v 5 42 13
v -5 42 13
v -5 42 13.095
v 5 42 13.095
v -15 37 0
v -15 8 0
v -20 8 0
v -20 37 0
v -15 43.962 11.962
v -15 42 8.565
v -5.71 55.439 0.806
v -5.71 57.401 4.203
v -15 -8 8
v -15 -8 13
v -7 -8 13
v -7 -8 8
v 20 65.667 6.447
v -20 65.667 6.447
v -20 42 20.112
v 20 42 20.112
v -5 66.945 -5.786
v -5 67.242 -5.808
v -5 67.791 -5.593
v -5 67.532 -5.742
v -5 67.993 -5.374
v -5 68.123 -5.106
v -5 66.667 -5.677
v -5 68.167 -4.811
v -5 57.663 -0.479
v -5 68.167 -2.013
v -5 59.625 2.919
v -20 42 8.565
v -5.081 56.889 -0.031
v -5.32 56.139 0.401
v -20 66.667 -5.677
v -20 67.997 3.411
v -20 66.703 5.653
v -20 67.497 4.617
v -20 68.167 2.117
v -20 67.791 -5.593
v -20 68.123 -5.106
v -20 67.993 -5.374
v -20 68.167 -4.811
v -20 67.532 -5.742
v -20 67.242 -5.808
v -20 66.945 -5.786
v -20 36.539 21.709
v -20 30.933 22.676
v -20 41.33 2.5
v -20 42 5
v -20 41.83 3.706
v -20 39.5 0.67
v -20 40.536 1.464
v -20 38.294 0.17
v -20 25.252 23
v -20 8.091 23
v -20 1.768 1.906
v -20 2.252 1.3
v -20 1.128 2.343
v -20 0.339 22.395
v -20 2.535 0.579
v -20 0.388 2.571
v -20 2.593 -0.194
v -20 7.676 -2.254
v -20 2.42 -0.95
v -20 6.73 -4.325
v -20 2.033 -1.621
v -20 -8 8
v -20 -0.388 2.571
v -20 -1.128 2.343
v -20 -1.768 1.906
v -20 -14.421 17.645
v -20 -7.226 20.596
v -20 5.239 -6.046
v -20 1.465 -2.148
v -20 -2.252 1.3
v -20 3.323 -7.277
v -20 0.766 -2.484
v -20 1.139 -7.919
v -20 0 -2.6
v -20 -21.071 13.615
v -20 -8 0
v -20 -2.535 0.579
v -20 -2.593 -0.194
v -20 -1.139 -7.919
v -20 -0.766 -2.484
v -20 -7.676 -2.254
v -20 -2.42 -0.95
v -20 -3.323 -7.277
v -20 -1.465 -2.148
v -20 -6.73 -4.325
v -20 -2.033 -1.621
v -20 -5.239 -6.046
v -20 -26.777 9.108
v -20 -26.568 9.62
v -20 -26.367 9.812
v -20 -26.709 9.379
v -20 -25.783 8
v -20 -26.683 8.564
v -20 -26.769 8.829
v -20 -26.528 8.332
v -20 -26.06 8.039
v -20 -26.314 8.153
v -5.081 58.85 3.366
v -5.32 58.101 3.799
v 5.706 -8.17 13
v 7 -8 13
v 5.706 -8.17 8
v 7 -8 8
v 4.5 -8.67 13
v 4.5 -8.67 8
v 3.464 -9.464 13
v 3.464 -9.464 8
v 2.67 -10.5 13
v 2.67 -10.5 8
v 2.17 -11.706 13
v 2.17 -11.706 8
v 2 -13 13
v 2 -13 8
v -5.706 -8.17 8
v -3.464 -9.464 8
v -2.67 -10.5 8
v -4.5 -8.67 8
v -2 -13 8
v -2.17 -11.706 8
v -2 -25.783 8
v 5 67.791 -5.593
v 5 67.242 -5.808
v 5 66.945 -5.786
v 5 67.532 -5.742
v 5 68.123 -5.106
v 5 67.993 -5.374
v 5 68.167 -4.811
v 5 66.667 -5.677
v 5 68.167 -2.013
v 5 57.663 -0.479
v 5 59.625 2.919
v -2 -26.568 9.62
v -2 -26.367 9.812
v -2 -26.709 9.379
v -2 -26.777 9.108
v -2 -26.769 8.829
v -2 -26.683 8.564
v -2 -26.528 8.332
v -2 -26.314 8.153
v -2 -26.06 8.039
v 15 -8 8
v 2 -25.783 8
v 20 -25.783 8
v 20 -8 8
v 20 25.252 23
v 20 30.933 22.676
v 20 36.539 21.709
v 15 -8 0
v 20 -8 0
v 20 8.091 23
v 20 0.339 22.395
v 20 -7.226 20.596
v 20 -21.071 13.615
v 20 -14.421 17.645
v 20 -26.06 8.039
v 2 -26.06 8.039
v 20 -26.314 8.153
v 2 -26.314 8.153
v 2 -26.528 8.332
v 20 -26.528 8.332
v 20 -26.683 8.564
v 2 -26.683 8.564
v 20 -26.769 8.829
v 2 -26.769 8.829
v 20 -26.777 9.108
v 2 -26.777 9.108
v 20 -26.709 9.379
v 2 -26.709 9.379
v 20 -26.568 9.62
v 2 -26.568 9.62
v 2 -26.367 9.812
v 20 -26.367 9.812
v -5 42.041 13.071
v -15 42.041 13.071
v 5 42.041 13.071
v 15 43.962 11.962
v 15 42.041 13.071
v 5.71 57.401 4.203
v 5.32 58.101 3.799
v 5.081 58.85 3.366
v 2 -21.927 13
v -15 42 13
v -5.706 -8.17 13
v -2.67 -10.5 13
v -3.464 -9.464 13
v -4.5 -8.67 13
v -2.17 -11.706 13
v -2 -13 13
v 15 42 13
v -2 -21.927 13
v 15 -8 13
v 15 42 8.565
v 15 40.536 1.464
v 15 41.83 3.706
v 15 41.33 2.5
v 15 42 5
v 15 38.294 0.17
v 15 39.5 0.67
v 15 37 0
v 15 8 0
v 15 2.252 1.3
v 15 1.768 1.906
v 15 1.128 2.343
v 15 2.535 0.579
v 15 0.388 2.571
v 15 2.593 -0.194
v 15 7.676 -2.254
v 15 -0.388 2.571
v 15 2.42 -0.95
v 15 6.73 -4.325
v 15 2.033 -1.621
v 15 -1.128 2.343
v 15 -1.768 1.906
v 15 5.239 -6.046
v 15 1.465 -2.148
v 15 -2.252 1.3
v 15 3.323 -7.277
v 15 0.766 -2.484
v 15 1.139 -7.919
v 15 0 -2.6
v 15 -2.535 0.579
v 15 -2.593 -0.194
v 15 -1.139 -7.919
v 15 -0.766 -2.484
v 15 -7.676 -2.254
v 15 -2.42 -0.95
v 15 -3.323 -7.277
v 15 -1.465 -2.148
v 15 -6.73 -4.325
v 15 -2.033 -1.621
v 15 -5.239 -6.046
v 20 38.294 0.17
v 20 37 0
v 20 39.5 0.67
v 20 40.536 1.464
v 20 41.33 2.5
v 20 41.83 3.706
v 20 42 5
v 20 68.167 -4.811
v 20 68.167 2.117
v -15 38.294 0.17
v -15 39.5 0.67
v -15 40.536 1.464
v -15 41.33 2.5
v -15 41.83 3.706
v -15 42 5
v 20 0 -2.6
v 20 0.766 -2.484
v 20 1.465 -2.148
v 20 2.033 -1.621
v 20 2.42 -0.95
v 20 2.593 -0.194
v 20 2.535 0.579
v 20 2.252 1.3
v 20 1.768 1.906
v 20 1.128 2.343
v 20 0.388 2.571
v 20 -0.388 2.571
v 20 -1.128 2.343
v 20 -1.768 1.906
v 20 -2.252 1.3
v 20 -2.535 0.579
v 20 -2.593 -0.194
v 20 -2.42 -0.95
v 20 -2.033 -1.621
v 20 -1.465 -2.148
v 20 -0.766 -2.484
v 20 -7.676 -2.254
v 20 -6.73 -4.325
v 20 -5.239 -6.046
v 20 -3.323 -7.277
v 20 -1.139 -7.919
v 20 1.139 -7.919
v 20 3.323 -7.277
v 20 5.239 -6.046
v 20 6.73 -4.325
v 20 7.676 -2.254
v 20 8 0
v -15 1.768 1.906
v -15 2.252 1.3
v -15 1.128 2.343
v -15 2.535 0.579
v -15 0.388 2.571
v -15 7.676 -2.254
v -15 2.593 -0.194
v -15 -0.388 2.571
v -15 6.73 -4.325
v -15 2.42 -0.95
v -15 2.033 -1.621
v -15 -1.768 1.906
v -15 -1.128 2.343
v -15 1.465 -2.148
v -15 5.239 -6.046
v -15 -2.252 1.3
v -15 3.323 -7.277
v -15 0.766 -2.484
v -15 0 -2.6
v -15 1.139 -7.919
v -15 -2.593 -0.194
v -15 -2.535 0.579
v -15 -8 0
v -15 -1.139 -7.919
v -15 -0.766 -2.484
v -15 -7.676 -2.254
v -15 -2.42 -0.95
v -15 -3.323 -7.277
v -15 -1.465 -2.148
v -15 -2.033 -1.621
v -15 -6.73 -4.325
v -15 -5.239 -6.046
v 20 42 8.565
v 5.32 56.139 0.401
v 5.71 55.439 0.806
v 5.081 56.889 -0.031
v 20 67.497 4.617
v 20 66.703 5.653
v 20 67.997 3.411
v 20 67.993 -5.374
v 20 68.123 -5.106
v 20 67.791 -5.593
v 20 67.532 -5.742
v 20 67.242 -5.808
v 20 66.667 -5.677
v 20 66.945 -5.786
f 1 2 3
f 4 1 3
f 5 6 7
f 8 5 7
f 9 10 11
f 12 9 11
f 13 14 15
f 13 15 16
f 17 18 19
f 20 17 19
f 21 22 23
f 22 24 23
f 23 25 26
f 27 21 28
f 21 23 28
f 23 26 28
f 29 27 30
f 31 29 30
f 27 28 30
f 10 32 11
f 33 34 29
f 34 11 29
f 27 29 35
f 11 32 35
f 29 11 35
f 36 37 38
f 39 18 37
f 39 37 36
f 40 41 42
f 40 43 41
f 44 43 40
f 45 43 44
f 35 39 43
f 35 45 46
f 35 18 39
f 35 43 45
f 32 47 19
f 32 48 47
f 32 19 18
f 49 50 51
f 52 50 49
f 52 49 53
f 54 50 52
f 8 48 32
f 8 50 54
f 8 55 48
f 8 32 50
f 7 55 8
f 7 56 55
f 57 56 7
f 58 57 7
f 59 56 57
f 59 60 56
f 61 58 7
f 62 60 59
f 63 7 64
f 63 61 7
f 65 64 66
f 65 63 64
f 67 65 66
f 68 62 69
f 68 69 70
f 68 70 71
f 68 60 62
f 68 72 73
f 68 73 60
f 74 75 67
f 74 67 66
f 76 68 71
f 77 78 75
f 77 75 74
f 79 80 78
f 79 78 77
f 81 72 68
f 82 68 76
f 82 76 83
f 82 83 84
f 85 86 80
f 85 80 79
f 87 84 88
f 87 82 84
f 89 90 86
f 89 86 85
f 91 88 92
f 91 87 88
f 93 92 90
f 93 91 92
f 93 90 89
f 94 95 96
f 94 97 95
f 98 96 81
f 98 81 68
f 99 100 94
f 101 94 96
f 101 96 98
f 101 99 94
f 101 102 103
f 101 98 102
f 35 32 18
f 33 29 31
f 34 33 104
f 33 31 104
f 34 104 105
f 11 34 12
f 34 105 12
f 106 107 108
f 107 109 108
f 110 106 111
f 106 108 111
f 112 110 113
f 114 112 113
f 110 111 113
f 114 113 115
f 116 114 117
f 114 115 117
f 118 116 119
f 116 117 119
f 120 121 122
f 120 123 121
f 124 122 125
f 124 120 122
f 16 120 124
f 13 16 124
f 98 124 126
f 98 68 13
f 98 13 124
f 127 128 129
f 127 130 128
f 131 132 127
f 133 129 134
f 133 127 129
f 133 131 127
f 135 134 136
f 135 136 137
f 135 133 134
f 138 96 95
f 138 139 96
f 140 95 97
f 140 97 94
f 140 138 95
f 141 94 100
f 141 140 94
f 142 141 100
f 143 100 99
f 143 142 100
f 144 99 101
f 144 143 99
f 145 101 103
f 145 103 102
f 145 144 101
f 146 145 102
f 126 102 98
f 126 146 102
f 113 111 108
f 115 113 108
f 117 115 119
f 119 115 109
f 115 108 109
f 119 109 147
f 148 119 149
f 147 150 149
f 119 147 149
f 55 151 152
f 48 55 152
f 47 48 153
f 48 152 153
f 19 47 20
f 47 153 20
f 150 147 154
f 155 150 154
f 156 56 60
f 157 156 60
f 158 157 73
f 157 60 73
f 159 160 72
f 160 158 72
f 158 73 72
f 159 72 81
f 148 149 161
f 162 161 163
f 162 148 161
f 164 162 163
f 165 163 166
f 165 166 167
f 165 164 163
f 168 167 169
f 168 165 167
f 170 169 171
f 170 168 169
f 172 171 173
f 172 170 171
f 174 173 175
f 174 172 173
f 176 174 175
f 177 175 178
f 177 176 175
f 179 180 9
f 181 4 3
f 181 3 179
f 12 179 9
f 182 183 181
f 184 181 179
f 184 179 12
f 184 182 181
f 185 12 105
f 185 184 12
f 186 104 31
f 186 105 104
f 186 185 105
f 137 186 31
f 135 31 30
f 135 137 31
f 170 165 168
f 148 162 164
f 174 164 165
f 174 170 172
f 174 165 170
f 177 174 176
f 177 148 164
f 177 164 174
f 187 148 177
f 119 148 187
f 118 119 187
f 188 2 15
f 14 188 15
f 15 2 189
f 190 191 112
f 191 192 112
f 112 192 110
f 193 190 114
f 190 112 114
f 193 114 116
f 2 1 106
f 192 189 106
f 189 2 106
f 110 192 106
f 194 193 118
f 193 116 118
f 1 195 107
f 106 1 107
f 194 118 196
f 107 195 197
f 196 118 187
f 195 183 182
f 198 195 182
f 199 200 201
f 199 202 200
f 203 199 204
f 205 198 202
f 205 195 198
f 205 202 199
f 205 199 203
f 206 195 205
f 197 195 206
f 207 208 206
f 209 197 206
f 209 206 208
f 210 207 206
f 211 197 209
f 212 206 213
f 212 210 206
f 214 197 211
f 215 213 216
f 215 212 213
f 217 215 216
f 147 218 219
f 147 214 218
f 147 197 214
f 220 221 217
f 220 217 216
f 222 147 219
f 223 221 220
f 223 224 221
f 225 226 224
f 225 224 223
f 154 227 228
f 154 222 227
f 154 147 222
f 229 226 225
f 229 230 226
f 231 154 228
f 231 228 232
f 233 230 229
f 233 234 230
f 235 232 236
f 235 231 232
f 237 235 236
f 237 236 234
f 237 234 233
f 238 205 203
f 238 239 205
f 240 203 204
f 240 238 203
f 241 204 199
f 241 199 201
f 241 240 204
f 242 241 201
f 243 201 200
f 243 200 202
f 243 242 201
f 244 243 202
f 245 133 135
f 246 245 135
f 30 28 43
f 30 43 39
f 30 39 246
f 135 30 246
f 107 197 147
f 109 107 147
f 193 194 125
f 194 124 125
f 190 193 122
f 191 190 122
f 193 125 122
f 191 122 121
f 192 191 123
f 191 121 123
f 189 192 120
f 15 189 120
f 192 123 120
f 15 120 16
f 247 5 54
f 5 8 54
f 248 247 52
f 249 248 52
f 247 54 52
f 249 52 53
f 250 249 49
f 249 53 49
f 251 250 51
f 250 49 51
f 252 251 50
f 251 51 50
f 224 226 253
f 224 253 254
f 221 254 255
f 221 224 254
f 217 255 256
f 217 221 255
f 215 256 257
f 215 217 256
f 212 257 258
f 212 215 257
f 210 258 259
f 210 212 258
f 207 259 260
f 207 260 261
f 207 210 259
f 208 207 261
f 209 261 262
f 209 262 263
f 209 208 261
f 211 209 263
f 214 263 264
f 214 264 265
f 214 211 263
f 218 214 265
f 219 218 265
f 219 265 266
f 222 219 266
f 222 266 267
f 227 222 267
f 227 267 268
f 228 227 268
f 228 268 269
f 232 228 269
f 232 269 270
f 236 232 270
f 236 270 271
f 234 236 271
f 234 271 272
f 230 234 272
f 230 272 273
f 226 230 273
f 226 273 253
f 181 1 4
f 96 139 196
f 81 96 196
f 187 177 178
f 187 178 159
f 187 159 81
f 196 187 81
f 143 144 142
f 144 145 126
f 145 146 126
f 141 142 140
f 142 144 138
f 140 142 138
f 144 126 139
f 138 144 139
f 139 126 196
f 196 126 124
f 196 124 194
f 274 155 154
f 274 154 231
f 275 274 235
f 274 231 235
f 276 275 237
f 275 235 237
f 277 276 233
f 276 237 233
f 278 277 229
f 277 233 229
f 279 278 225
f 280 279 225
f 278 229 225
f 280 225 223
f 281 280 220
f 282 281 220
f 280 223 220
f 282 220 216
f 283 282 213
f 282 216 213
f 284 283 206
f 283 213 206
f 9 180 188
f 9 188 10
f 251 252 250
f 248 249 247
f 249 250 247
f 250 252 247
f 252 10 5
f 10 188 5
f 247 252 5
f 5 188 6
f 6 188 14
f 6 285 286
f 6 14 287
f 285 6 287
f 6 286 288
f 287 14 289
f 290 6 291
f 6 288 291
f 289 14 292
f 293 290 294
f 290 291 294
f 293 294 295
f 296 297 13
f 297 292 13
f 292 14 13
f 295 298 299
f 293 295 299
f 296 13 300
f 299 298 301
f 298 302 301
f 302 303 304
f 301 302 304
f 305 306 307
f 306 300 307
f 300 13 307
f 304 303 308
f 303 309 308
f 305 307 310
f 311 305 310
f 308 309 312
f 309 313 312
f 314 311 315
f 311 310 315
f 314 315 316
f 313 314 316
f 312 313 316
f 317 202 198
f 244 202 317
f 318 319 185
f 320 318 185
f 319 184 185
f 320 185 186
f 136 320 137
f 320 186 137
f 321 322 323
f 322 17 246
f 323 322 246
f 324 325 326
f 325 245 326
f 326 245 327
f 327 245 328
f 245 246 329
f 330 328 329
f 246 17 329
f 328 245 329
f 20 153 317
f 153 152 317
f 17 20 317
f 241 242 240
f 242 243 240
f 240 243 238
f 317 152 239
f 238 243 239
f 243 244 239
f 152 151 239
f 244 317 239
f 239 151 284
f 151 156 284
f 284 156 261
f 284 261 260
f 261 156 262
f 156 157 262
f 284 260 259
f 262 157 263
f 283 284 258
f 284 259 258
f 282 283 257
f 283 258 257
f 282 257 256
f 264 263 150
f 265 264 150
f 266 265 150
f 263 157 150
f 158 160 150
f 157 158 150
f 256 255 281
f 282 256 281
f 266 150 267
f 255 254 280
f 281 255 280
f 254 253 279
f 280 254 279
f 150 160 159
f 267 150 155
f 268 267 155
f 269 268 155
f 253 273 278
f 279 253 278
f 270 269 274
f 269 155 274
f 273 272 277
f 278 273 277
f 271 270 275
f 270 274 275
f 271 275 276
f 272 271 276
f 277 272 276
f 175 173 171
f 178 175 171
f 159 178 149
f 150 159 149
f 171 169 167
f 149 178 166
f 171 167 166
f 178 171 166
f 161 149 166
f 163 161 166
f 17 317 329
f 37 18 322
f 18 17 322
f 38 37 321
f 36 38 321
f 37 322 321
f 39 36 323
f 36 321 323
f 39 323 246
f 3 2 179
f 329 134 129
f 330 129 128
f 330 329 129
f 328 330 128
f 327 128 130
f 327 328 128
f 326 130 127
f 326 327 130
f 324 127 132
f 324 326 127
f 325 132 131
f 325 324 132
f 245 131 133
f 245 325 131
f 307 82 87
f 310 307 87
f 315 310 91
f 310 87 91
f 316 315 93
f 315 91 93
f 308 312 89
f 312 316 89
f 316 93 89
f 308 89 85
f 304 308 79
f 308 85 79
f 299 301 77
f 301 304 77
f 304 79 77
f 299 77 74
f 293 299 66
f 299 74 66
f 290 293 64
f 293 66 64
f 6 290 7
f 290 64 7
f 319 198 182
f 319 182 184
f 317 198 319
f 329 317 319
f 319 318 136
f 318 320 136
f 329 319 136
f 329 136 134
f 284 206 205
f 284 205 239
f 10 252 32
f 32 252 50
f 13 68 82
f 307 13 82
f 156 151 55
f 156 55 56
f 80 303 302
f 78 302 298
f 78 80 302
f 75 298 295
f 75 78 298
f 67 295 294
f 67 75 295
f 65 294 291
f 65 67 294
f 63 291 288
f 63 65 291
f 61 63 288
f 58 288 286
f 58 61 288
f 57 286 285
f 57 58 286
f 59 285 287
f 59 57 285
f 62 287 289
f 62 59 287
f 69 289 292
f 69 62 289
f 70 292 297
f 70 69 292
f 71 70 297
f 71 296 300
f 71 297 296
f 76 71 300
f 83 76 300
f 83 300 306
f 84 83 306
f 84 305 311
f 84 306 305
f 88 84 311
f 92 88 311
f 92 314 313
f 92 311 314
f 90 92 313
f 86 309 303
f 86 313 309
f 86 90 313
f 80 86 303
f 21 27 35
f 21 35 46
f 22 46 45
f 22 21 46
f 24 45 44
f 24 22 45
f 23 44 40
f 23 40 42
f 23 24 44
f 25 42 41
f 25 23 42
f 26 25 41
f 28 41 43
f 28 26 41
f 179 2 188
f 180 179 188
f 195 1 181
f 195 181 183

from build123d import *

# Parameters (mm, degrees)
BOSS_EXTRUDE5_DEPTH      = 20
BOSS_EXTRUDE5_DEPTH_BACK = 20
SKETCH6_R                = 2.6000000000000005
SKETCH7_W                = 30.000000000000004
SKETCH7_H                = 21
CUT_EXTRUDE1_DEPTH       = 16
BOSS_EXTRUDE6_DEPTH      = 18
BOSS_EXTRUDE7_DEPTH      = 4
SKETCH12_W               = 4.9999999999999964
SKETCH12_H               = 12.999999999999998
BOSS_EXTRUDE8_DEPTH      = 34
FILLET4_R                = 5
FILLET5_R                = 1
CUT_EXTRUDE3_START       = -15
CUT_EXTRUDE3_DEPTH       = 10
CUT_EXTRUDE4_DEPTH       = 3.923095079
FILLET7_R                = 5
FILLET8_R                = 50


with BuildPart() as part:
    # Sketch6 → Boss-Extrude5 (new, two sides: drawn at the far end of the back side and taken through both)
    with BuildSketch(Plane(origin=(0, 0, 0), x_dir=(0, 0, -1), z_dir=(1, 0, 0)).offset(-BOSS_EXTRUDE5_DEPTH_BACK)):
        with BuildLine():
            Line((-23, -8), (0, -8))
            ThreePointArc((0, -8), (8, 0), (0, 8))
            Line((0, 8), (-13, 7.999999999999998))
            Line((-13, 7.999999999999998), (-13, 42))
            Line((-13, 42), (-8.56466921236316, 42))
            Line((-8.56466921236316, 42), (6.542901083469773, 68.16707933130117))
            Line((6.542901083469773, 68.16707933130117), (-5.004104300322731, 68.16707933130117))
            Line((-5.004104300322731, 68.16707933130117), (-20.111674596155662, 42))
            Line((-20.111674596155662, 42), (-23, 42))
            Line((-23, 42), (-23, -8))
        make_face()
        Circle(SKETCH6_R, mode=Mode.SUBTRACT)
    extrude(amount=BOSS_EXTRUDE5_DEPTH + BOSS_EXTRUDE5_DEPTH_BACK)

    # Sketch7 → Cut-Extrude1 (cut)
    with BuildSketch(Plane(origin=(0, 8, 1.07e-15), x_dir=(1, 0, 0), z_dir=(0, 1, 0))):
        with Locations((0, -2.4999999999999982)):
            Rectangle(SKETCH7_W, SKETCH7_H)
    extrude(amount=-CUT_EXTRUDE1_DEPTH, mode=Mode.SUBTRACT)

    # Sketch9 → Boss-Extrude6 (add)
    with BuildSketch(Plane(origin=(20, 0, 0), x_dir=(0, 0, -1), z_dir=(1, 0, 0))):
        Polygon((-8, -8), (-7.9999999999999964, -28.890618944469697), (-23, -8), align=None)
    boss_extrude6 = extrude(amount=-BOSS_EXTRUDE6_DEPTH)

    # Mirror1: Boss-Extrude6 across plane
    add(boss_extrude6.mirror(Plane(origin=(0, 0, 0), x_dir=(0, 0, 1), z_dir=(1, 0, 0))))

    # Sketch10 → Boss-Extrude7 (add)
    with BuildSketch(Plane.ZY.offset(-2)):
        Polygon((23, -8), (13, -8), (13.000000000000004, -21.927079296313124), align=None)
    extrude(amount=BOSS_EXTRUDE7_DEPTH)

    # Sketch12 → Boss-Extrude8 (add)
    with BuildSketch(Plane(origin=(0, 8, 1.07e-15), x_dir=(1, 0, 0), z_dir=(0, 1, 1.3e-16))):
        with Locations((17.5, -6.499999999999999)):
            Rectangle(SKETCH12_W, SKETCH12_H)
    boss_extrude8 = extrude(amount=BOSS_EXTRUDE8_DEPTH)

    # Mirror2: Boss-Extrude8 across plane
    add(boss_extrude8.mirror(Plane(origin=(0, 0, 0), x_dir=(0, 0, 1), z_dir=(1, 0, 0))))

    # Fillet4
    fillet4_edges = [part.edges().sort_by_distance(p)[0] for p in [
        (2, -8, 10.5),
        (-2, -8, 10.5),
    ]]
    fillet(fillet4_edges, radius=FILLET4_R)

    # Fillet5
    fillet5_edges = [part.edges().sort_by_distance(p)[0] for p in [
        (0, 68.16707933130117, -6.542901083469773),
        (11, -28.890618944469697, 7.9999999999999964),
        (-11, -28.890618944469697, 7.9999999999999964),
    ]]
    fillet(fillet5_edges, radius=FILLET5_R)

    # Sketch13 → Cut-Extrude3 (cut)
    with BuildSketch(Plane(origin=(20, 0, 0), x_dir=(0, 0, -1), z_dir=(1, 0, 0)).offset(CUT_EXTRUDE3_START)):
        Polygon((6.542901083469864, 68.16707933130117), (-8.56466921236316, 42), (-13.094669212363161, 42), (2.0129010834698517, 68.16707933130117), align=None)
    extrude(amount=-CUT_EXTRUDE3_DEPTH, mode=Mode.SUBTRACT)

    # Sketch14 → Cut-Extrude4 (cut)
    with BuildSketch(Plane(origin=(0, 14.20861055645838, 24.61003538874555), x_dir=(-1, 0, 0), z_dir=(0, -0.49999999999999784, -0.8660254037844399))):
        Polygon((-15.000000000000004, 32.090732352764924), (-5.000000000000001, 48.794944027775955), (-5.000000000000001, 32.090732352764924), (-5.000000000000001, 29.87306695894652), (-15.000000000000007, 29.87306695894652), align=None)
    cut_extrude4 = extrude(amount=-CUT_EXTRUDE4_DEPTH, mode=Mode.SUBTRACT)

    # Mirror3: Cut-Extrude4 across plane
    add(cut_extrude4.mirror(Plane(origin=(0, 0, 0), x_dir=(0, 0, 1), z_dir=(1, 0, 0))), mode=Mode.SUBTRACT)

    # Fillet7
    fillet7_edges = [part.edges().sort_by_distance(p)[0] for p in [
        (17.5, 42, 5.6e-15),
        (-17.5, 42, 5.6e-15),
        (0, 68.16707933130117, 5.004104300322731),
        (5.000000000000001, 57.44704543050219, 1.9113133747955424),
        (-5.000000000000001, 57.44704543050219, 1.9113133747955426),
    ]]
    fillet(fillet7_edges, radius=FILLET7_R)

    # Fillet8
    # the kernel refuses this fillet: 50 mm, written as the material it takes off along each edge
    with BuildSketch(Plane(origin=(61.869597916190855, 42, 23), x_dir=(0, 0, -1), z_dir=(-1, 0, 0))) as fillet8_piece_1:
        with BuildLine():
            CenterArc((50, 16.747839166469827), FILLET8_R, 180, 19.569909983271373)
            Line((0, 16.747839166469827), (-1, 16.747839166469827))
            Line((-1, 16.747839166469827), (-1, 0))
            Line((-1, 0), (0, -1))
            ThreePointArc((0, -1), (1.444162701922167, -1), (1.946091911921222, -0.33495678332939605))
            Line((1.946091911921222, -0.33495678332939605), (2.888325403844334, 0))
        make_face()
    extrude(amount=123.73919583238171, mode=Mode.SUBTRACT)
    with BuildSketch(Plane(origin=(-60.228570108654466, -8.000000000000004, 23), x_dir=(0, -0.812294131590468, -0.5832480122415225), z_dir=(1, 0, 0))) as fillet8_piece_2:
        with BuildLine():
            CenterArc((FILLET8_R * 0.321828560869, FILLET8_R), FILLET8_R, 234.32068370191269, 35.67931629808726)
            Line((-FILLET8_R * 0.261419451372, FILLET8_R * 0.18770586841), (-FILLET8_R * 0.273084411617, FILLET8_R * 0.171459985778))
            Line((-FILLET8_R * 0.273084411617, FILLET8_R * 0.171459985778), (-FILLET8_R * 0.00643657121738, -FILLET8_R * 0.02))
            Line((-FILLET8_R * 0.00643657121738, -FILLET8_R * 0.02), (FILLET8_R * 0.321828560869, -FILLET8_R * 0.02))
            Line((FILLET8_R * 0.321828560869, -FILLET8_R * 0.02), (FILLET8_R * 0.321828560869, 5e-16))
        make_face()
    extrude(amount=120.45714021730896, mode=Mode.SUBTRACT)


solid = part.part
